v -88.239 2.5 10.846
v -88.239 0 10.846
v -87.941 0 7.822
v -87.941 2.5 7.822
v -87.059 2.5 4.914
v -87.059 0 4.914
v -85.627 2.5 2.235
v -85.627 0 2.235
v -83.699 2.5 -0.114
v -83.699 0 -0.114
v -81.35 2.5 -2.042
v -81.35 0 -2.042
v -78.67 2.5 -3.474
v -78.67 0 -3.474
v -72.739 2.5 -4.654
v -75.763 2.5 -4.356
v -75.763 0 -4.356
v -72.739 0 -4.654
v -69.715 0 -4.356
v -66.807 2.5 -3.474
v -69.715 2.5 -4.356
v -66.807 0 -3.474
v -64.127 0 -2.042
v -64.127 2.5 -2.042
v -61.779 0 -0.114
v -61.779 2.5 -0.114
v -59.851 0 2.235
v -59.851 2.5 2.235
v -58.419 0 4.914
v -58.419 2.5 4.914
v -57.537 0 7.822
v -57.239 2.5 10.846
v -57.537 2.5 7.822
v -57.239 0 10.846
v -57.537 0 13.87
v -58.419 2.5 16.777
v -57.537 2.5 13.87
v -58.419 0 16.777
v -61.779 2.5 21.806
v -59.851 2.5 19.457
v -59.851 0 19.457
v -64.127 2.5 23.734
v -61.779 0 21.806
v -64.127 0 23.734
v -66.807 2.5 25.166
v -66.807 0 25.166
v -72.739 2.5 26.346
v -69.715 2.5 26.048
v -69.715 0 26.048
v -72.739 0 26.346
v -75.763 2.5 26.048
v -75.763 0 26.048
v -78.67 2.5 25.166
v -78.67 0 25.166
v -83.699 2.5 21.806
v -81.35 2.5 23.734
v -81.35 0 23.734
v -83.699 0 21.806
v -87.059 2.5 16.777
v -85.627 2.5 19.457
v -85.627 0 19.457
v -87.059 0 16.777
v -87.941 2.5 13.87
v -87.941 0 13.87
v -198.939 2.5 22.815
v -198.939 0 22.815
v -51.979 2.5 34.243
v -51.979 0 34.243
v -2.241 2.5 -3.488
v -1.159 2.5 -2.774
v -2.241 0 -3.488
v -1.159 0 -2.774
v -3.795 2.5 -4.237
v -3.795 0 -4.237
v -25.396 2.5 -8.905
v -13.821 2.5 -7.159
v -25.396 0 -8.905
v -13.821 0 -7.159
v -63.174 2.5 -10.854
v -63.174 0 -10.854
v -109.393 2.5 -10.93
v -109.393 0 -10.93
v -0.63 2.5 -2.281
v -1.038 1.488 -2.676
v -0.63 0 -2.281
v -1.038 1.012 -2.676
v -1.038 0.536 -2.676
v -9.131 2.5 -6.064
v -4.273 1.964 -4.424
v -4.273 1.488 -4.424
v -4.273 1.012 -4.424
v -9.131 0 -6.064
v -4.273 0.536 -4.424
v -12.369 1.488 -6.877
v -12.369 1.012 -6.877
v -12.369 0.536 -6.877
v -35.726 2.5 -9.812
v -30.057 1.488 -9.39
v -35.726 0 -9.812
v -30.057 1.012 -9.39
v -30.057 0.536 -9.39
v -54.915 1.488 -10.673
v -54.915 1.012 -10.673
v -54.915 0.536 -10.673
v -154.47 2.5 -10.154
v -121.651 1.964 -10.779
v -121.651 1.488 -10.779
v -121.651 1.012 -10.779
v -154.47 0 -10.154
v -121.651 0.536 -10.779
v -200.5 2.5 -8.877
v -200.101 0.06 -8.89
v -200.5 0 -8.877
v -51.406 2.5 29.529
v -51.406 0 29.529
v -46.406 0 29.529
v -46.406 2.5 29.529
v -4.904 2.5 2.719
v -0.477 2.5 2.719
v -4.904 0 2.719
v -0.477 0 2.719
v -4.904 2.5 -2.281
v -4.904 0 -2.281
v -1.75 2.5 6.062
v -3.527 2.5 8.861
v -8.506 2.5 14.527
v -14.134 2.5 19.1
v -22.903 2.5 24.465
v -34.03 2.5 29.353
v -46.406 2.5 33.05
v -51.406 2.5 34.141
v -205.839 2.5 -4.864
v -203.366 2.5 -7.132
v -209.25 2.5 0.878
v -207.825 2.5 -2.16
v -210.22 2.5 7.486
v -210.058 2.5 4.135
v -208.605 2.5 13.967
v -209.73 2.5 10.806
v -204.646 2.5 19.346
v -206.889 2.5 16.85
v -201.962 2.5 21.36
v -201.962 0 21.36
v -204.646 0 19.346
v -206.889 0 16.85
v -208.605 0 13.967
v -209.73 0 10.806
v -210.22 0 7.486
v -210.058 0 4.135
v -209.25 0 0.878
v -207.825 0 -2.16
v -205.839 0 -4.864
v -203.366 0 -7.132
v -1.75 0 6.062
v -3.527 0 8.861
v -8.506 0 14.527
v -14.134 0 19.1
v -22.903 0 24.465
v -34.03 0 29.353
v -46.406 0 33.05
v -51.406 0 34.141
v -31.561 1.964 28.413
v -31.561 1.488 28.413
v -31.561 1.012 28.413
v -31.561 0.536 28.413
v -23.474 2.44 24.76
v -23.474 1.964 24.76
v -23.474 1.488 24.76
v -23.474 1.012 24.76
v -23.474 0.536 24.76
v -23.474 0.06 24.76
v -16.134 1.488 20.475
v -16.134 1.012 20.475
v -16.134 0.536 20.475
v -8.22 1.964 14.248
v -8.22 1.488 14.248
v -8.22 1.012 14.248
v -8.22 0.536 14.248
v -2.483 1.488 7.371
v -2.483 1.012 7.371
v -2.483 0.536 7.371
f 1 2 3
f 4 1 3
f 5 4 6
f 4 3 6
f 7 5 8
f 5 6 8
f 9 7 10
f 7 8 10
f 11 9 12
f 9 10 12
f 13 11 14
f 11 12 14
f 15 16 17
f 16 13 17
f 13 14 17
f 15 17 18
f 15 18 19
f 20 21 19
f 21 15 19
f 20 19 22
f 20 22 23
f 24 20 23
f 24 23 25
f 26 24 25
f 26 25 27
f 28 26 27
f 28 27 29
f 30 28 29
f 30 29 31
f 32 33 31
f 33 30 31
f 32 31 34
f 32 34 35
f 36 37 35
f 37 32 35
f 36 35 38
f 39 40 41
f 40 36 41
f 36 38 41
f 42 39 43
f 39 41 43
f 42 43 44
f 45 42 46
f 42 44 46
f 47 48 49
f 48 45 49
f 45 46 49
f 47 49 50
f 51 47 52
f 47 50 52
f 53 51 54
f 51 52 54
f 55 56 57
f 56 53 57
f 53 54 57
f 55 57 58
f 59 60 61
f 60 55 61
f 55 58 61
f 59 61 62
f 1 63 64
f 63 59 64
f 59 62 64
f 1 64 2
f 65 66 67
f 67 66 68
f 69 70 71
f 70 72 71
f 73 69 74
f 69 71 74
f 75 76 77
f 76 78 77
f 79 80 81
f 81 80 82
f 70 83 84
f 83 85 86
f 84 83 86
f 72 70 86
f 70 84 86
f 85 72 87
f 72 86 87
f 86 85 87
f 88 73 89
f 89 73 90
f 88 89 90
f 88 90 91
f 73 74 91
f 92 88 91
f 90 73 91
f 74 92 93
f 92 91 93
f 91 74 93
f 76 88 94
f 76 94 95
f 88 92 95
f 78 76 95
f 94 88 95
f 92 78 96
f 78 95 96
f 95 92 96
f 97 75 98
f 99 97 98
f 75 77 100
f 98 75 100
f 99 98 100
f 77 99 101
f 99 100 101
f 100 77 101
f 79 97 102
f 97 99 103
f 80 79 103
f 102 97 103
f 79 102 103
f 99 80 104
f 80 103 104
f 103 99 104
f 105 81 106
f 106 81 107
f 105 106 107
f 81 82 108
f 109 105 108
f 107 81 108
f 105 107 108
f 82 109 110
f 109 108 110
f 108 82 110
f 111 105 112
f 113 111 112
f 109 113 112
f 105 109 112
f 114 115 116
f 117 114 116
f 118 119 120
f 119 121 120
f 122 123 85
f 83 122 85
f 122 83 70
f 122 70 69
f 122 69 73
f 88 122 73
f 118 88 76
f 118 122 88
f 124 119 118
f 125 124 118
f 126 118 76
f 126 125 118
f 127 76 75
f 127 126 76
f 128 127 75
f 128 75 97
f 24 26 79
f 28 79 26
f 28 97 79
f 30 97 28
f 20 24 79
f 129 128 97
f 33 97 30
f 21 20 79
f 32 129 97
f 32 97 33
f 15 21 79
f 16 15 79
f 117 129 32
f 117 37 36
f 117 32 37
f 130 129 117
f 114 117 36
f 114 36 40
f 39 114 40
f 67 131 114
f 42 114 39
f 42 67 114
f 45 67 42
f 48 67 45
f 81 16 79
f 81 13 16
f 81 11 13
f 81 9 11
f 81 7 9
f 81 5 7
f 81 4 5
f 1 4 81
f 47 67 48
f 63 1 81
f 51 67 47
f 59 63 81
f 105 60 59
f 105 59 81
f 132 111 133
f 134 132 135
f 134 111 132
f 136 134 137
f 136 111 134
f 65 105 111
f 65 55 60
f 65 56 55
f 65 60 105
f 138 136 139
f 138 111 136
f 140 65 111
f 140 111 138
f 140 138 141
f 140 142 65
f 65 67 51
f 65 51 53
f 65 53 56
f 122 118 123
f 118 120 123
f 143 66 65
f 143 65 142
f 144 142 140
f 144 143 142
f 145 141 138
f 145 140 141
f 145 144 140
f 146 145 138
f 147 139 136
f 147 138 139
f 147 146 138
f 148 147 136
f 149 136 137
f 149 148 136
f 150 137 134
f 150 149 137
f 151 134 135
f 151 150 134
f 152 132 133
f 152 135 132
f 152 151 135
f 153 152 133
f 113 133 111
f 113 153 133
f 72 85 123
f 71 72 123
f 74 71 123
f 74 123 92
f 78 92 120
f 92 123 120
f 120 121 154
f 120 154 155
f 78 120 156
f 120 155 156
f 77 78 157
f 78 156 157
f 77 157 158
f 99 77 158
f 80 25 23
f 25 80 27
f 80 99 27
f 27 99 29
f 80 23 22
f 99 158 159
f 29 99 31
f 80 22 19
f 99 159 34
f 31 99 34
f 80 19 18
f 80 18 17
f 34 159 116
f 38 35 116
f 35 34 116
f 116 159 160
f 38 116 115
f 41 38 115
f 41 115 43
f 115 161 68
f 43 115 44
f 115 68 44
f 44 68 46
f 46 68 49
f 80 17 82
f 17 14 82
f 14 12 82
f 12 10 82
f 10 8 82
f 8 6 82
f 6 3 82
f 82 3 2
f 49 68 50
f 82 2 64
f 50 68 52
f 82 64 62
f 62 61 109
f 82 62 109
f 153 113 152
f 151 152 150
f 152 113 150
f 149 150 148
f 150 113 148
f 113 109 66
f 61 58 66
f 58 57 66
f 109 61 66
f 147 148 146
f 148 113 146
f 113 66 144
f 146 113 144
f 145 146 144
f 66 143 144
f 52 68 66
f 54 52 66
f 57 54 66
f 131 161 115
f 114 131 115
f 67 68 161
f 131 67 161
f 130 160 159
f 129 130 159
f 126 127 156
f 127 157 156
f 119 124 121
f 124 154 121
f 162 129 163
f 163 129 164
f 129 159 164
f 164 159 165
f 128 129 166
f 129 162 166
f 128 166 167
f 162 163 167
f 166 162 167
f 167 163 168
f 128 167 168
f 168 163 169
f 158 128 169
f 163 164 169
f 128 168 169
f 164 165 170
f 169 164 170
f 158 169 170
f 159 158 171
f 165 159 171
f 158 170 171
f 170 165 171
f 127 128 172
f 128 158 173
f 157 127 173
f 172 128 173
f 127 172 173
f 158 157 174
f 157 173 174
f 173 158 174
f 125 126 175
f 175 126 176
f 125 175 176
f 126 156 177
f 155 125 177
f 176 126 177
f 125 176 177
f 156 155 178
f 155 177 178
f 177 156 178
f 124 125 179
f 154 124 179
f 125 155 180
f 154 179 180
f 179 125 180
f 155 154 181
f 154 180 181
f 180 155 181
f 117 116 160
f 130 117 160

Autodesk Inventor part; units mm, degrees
ref_plane "YZ Plane" through (0, 0, 0) normal (1, 0, 0) x (0, 1, 0)
ref_plane "XZ Plane" through (0, 0, 0) normal (0, 1, 0) x (-1, 0, 0)
ref_plane "XY Plane" through (0, 0, 0) normal (0, 0, 1) x (1, 0, 0)
sketch "Sketch1" plane through (0, 0, 0) normal (0, 1, 0) x (-1, 0, 0)
  spline S0 degree 4 poles (51.979, 34.2431) (49.1051, 33.7566) (39.5332, 31.5872) (30.1137, 28.1904) (19.6059, 22.8943) (13.0923, 18.5073) (7.8605, 14.3051) (3.9363, 9.4088) (1.5106, 6.3896) (0.0434, 1.3996) (-0.032, 0.3871) (0.028, -0.8915) (0.1768, -1.4854) (0.3983, -2.0441) (0.8215, -2.5037) (1.3408, -2.946) (2.6667, -3.7655) (3.7155, -4.2634) (10.6098, -6.747) (15.9249, -7.4764) (25.5133, -9.1262) (35.8155, -9.8616) (48.4495, -10.5455) (62.4279, -10.8762) (77.9663, -11.0677) (94.722, -11.0635) (112.5613, -10.9225) (131.2432, -10.6462) (150.5553, -10.2615) (170.2642, -9.7779) (190.1377, -9.2151) (209.9398, -8.5807) (229.4366, -7.8911) (248.3971, -7.1484) (266.6047, -6.3637) (283.8414, -5.5226) (299.9482, -4.5961) (314.7433, -3.6129) (328.1612, -2.6484) (339.8268, -1.769) (350.012, -1.0496) (357.5866, -0.5225) (364.806, -0.1794) (367.4848, -0.031) (370.1657, -0.0078) (369.9872, 0.0018) knots 0 0 0 0 0 0.056172 0.079777 0.102171 0.123272 0.142974 0.16113 0.176202 0.188392 0.197687 0.204488 0.210696 0.216571 0.223012 0.230232 0.240513 0.254518 0.272366 0.294434 0.318911 0.345468 0.373865 0.403873 0.435249 0.467749 0.501146 0.535218 0.569752 0.604537 0.639365 0.674029 0.708317 0.742021 0.774934 0.806859 0.837599 0.866942 0.894636 0.920358 0.943684 0.964014 0.980302 1 1 1 1 1
  circle A0 centre (370, 0) radius 160 construction
  line L0 (370, 0) -> (211.4974, 21.8387)
  circle A1 centre (211.4974, 21.8387) radius 160 construction
  line L1 (211.4974, 21.8387) -> (51.979, 34.2431)
  line L2 (-0.096, 2.719) -> (4.904, 2.719)
  line L3 (4.904, 2.719) -> (4.904, -2.281)
  line L4 (4.904, -2.281) -> (-0.096, -2.281)
  line L5 (-0.096, -2.281) -> (-0.096, 2.719)
  circle A2 centre (369.9872, 0.0018) radius 3 construction
  line L6 (365.7713, 2.7478) -> (370.7713, 2.7478)
  line L7 (370.7713, 2.7478) -> (370.7713, -2.2522)
  line L8 (370.7713, -2.2522) -> (365.7713, -2.2522)
  line L9 (365.7713, -2.2522) -> (365.7713, 2.7478)
  line L10 (211.4974, 21.8387) -> (210.0997, -8.5616) construction
  arc A3 (200.5005, -8.8773) -> (198.939, 22.8152) centre (193.0135, 6.6385) ccw
  arc A4 (220.3414, 20.6201) -> (219.1363, -8.2496) centre (229.7182, 5.7687) ccw
  line L11 (46.4065, 34.5291) -> (51.4065, 34.5291)
  line L12 (51.4065, 34.5291) -> (51.4065, 29.5291)
  line L13 (51.4065, 29.5291) -> (46.4065, 29.5291)
  line L14 (46.4065, 29.5291) -> (46.4065, 34.5291)
  line L15 (46.4065, 34.5291) -> (51.4065, 29.5291) construction
  line L16 (51.4065, 34.5291) -> (46.4065, 29.5291) construction
  circle A5 centre (229.7182, 5.7687) radius 11.5
  circle A6 centre (229.7182, 5.7687) radius 4
  circle A7 centre (72.7388, 10.8459) radius 15.5
  point P0 (0, 0)
  point P1 (370, 0)
  point P2 (35.937, 30.0257)
  point P3 (27.0238, 26.4761)
  point P4 (19.2974, 22.4624)
  point P5 (12.8156, 18.139)
  point P6 (7.6237, 13.6489)
  point P7 (3.7499, 9.1521)
  point P8 (1.2115, 4.8535)
  point P9 (0.0668, 1.0195)
  point P10 (0.0003, -0.0638)
  point P11 (0.0755, -0.9849)
  point P12 (0.2106, -1.5356)
  point P13 (0.4302, -2.0122)
  point P14 (0.7739, -2.4345)
  point P15 (1.2488, -2.8423)
  point P16 (2.1566, -3.4383)
  point P17 (3.2773, -4.0196)
  point P18 (8.2772, -5.8071)
  point P19 (15.3669, -7.4261)
  point P20 (24.3167, -8.7706)
  point P21 (35.0526, -9.7678)
  point P22 (47.5438, -10.4262)
  point P23 (61.6814, -10.8267)
  point P24 (77.2847, -11.0213)
  point P25 (94.162, -11.0379)
  point P26 (112.1091, -10.9014)
  point P27 (130.911, -10.6315)
  point P28 (150.3435, -10.2474)
  point P29 (170.176, -9.7646)
  point P30 (190.1737, -9.1986)
  point P31 (229.7182, -7.8653)
  point P32 (248.7963, -7.1166)
  point P33 (267.1071, -6.3194)
  point P34 (284.4371, -5.4606)
  point P35 (300.619, -4.5258)
  point P36 (315.5184, -3.5432)
  point P37 (328.988, -2.5786)
  point P38 (340.8625, -1.7041)
  point P39 (350.9622, -0.9861)
  point P40 (359.0984, -0.4682)
  point P41 (365.0855, -0.1602)
  point P42 (368.7597, -0.0285)
  point P43 (370, 0)
  point P44 (0.4773, 2.719)
  point P45 (0.6305, -2.281)
  point P46 (365.7713, -0.1283)
  point P47 (368.4073, 0.2194)
  point P48 (48.9065, 32.0291)
  point P49 (112.1091, -11.9485)
  point P50 (365.7713, 0.5826)
  point P51 (51.4065, 34.1414)
  point P52 (46.4065, 33.0501)
  dimension "d5" = 160
  dimension "d8" = 160
  dimension "d17" = 5
  dimension "d18" = 5
  dimension "d25" = 6
  dimension "d26" = 5
  dimension "d27" = 5
  dimension "d36" = 5
  dimension "d37" = 5
  dimension "d41" = 23
  dimension "d50" = 368.7594
  dimension "d60" = 8
  dimension "d62" = 31
extrude "Extrusion4" add sketch "Sketch1" along normal blind 2.5 contours S0 L4 L3 L2 L14 L13 L12 L1 A3
properties part number "airfoil blueprint"
